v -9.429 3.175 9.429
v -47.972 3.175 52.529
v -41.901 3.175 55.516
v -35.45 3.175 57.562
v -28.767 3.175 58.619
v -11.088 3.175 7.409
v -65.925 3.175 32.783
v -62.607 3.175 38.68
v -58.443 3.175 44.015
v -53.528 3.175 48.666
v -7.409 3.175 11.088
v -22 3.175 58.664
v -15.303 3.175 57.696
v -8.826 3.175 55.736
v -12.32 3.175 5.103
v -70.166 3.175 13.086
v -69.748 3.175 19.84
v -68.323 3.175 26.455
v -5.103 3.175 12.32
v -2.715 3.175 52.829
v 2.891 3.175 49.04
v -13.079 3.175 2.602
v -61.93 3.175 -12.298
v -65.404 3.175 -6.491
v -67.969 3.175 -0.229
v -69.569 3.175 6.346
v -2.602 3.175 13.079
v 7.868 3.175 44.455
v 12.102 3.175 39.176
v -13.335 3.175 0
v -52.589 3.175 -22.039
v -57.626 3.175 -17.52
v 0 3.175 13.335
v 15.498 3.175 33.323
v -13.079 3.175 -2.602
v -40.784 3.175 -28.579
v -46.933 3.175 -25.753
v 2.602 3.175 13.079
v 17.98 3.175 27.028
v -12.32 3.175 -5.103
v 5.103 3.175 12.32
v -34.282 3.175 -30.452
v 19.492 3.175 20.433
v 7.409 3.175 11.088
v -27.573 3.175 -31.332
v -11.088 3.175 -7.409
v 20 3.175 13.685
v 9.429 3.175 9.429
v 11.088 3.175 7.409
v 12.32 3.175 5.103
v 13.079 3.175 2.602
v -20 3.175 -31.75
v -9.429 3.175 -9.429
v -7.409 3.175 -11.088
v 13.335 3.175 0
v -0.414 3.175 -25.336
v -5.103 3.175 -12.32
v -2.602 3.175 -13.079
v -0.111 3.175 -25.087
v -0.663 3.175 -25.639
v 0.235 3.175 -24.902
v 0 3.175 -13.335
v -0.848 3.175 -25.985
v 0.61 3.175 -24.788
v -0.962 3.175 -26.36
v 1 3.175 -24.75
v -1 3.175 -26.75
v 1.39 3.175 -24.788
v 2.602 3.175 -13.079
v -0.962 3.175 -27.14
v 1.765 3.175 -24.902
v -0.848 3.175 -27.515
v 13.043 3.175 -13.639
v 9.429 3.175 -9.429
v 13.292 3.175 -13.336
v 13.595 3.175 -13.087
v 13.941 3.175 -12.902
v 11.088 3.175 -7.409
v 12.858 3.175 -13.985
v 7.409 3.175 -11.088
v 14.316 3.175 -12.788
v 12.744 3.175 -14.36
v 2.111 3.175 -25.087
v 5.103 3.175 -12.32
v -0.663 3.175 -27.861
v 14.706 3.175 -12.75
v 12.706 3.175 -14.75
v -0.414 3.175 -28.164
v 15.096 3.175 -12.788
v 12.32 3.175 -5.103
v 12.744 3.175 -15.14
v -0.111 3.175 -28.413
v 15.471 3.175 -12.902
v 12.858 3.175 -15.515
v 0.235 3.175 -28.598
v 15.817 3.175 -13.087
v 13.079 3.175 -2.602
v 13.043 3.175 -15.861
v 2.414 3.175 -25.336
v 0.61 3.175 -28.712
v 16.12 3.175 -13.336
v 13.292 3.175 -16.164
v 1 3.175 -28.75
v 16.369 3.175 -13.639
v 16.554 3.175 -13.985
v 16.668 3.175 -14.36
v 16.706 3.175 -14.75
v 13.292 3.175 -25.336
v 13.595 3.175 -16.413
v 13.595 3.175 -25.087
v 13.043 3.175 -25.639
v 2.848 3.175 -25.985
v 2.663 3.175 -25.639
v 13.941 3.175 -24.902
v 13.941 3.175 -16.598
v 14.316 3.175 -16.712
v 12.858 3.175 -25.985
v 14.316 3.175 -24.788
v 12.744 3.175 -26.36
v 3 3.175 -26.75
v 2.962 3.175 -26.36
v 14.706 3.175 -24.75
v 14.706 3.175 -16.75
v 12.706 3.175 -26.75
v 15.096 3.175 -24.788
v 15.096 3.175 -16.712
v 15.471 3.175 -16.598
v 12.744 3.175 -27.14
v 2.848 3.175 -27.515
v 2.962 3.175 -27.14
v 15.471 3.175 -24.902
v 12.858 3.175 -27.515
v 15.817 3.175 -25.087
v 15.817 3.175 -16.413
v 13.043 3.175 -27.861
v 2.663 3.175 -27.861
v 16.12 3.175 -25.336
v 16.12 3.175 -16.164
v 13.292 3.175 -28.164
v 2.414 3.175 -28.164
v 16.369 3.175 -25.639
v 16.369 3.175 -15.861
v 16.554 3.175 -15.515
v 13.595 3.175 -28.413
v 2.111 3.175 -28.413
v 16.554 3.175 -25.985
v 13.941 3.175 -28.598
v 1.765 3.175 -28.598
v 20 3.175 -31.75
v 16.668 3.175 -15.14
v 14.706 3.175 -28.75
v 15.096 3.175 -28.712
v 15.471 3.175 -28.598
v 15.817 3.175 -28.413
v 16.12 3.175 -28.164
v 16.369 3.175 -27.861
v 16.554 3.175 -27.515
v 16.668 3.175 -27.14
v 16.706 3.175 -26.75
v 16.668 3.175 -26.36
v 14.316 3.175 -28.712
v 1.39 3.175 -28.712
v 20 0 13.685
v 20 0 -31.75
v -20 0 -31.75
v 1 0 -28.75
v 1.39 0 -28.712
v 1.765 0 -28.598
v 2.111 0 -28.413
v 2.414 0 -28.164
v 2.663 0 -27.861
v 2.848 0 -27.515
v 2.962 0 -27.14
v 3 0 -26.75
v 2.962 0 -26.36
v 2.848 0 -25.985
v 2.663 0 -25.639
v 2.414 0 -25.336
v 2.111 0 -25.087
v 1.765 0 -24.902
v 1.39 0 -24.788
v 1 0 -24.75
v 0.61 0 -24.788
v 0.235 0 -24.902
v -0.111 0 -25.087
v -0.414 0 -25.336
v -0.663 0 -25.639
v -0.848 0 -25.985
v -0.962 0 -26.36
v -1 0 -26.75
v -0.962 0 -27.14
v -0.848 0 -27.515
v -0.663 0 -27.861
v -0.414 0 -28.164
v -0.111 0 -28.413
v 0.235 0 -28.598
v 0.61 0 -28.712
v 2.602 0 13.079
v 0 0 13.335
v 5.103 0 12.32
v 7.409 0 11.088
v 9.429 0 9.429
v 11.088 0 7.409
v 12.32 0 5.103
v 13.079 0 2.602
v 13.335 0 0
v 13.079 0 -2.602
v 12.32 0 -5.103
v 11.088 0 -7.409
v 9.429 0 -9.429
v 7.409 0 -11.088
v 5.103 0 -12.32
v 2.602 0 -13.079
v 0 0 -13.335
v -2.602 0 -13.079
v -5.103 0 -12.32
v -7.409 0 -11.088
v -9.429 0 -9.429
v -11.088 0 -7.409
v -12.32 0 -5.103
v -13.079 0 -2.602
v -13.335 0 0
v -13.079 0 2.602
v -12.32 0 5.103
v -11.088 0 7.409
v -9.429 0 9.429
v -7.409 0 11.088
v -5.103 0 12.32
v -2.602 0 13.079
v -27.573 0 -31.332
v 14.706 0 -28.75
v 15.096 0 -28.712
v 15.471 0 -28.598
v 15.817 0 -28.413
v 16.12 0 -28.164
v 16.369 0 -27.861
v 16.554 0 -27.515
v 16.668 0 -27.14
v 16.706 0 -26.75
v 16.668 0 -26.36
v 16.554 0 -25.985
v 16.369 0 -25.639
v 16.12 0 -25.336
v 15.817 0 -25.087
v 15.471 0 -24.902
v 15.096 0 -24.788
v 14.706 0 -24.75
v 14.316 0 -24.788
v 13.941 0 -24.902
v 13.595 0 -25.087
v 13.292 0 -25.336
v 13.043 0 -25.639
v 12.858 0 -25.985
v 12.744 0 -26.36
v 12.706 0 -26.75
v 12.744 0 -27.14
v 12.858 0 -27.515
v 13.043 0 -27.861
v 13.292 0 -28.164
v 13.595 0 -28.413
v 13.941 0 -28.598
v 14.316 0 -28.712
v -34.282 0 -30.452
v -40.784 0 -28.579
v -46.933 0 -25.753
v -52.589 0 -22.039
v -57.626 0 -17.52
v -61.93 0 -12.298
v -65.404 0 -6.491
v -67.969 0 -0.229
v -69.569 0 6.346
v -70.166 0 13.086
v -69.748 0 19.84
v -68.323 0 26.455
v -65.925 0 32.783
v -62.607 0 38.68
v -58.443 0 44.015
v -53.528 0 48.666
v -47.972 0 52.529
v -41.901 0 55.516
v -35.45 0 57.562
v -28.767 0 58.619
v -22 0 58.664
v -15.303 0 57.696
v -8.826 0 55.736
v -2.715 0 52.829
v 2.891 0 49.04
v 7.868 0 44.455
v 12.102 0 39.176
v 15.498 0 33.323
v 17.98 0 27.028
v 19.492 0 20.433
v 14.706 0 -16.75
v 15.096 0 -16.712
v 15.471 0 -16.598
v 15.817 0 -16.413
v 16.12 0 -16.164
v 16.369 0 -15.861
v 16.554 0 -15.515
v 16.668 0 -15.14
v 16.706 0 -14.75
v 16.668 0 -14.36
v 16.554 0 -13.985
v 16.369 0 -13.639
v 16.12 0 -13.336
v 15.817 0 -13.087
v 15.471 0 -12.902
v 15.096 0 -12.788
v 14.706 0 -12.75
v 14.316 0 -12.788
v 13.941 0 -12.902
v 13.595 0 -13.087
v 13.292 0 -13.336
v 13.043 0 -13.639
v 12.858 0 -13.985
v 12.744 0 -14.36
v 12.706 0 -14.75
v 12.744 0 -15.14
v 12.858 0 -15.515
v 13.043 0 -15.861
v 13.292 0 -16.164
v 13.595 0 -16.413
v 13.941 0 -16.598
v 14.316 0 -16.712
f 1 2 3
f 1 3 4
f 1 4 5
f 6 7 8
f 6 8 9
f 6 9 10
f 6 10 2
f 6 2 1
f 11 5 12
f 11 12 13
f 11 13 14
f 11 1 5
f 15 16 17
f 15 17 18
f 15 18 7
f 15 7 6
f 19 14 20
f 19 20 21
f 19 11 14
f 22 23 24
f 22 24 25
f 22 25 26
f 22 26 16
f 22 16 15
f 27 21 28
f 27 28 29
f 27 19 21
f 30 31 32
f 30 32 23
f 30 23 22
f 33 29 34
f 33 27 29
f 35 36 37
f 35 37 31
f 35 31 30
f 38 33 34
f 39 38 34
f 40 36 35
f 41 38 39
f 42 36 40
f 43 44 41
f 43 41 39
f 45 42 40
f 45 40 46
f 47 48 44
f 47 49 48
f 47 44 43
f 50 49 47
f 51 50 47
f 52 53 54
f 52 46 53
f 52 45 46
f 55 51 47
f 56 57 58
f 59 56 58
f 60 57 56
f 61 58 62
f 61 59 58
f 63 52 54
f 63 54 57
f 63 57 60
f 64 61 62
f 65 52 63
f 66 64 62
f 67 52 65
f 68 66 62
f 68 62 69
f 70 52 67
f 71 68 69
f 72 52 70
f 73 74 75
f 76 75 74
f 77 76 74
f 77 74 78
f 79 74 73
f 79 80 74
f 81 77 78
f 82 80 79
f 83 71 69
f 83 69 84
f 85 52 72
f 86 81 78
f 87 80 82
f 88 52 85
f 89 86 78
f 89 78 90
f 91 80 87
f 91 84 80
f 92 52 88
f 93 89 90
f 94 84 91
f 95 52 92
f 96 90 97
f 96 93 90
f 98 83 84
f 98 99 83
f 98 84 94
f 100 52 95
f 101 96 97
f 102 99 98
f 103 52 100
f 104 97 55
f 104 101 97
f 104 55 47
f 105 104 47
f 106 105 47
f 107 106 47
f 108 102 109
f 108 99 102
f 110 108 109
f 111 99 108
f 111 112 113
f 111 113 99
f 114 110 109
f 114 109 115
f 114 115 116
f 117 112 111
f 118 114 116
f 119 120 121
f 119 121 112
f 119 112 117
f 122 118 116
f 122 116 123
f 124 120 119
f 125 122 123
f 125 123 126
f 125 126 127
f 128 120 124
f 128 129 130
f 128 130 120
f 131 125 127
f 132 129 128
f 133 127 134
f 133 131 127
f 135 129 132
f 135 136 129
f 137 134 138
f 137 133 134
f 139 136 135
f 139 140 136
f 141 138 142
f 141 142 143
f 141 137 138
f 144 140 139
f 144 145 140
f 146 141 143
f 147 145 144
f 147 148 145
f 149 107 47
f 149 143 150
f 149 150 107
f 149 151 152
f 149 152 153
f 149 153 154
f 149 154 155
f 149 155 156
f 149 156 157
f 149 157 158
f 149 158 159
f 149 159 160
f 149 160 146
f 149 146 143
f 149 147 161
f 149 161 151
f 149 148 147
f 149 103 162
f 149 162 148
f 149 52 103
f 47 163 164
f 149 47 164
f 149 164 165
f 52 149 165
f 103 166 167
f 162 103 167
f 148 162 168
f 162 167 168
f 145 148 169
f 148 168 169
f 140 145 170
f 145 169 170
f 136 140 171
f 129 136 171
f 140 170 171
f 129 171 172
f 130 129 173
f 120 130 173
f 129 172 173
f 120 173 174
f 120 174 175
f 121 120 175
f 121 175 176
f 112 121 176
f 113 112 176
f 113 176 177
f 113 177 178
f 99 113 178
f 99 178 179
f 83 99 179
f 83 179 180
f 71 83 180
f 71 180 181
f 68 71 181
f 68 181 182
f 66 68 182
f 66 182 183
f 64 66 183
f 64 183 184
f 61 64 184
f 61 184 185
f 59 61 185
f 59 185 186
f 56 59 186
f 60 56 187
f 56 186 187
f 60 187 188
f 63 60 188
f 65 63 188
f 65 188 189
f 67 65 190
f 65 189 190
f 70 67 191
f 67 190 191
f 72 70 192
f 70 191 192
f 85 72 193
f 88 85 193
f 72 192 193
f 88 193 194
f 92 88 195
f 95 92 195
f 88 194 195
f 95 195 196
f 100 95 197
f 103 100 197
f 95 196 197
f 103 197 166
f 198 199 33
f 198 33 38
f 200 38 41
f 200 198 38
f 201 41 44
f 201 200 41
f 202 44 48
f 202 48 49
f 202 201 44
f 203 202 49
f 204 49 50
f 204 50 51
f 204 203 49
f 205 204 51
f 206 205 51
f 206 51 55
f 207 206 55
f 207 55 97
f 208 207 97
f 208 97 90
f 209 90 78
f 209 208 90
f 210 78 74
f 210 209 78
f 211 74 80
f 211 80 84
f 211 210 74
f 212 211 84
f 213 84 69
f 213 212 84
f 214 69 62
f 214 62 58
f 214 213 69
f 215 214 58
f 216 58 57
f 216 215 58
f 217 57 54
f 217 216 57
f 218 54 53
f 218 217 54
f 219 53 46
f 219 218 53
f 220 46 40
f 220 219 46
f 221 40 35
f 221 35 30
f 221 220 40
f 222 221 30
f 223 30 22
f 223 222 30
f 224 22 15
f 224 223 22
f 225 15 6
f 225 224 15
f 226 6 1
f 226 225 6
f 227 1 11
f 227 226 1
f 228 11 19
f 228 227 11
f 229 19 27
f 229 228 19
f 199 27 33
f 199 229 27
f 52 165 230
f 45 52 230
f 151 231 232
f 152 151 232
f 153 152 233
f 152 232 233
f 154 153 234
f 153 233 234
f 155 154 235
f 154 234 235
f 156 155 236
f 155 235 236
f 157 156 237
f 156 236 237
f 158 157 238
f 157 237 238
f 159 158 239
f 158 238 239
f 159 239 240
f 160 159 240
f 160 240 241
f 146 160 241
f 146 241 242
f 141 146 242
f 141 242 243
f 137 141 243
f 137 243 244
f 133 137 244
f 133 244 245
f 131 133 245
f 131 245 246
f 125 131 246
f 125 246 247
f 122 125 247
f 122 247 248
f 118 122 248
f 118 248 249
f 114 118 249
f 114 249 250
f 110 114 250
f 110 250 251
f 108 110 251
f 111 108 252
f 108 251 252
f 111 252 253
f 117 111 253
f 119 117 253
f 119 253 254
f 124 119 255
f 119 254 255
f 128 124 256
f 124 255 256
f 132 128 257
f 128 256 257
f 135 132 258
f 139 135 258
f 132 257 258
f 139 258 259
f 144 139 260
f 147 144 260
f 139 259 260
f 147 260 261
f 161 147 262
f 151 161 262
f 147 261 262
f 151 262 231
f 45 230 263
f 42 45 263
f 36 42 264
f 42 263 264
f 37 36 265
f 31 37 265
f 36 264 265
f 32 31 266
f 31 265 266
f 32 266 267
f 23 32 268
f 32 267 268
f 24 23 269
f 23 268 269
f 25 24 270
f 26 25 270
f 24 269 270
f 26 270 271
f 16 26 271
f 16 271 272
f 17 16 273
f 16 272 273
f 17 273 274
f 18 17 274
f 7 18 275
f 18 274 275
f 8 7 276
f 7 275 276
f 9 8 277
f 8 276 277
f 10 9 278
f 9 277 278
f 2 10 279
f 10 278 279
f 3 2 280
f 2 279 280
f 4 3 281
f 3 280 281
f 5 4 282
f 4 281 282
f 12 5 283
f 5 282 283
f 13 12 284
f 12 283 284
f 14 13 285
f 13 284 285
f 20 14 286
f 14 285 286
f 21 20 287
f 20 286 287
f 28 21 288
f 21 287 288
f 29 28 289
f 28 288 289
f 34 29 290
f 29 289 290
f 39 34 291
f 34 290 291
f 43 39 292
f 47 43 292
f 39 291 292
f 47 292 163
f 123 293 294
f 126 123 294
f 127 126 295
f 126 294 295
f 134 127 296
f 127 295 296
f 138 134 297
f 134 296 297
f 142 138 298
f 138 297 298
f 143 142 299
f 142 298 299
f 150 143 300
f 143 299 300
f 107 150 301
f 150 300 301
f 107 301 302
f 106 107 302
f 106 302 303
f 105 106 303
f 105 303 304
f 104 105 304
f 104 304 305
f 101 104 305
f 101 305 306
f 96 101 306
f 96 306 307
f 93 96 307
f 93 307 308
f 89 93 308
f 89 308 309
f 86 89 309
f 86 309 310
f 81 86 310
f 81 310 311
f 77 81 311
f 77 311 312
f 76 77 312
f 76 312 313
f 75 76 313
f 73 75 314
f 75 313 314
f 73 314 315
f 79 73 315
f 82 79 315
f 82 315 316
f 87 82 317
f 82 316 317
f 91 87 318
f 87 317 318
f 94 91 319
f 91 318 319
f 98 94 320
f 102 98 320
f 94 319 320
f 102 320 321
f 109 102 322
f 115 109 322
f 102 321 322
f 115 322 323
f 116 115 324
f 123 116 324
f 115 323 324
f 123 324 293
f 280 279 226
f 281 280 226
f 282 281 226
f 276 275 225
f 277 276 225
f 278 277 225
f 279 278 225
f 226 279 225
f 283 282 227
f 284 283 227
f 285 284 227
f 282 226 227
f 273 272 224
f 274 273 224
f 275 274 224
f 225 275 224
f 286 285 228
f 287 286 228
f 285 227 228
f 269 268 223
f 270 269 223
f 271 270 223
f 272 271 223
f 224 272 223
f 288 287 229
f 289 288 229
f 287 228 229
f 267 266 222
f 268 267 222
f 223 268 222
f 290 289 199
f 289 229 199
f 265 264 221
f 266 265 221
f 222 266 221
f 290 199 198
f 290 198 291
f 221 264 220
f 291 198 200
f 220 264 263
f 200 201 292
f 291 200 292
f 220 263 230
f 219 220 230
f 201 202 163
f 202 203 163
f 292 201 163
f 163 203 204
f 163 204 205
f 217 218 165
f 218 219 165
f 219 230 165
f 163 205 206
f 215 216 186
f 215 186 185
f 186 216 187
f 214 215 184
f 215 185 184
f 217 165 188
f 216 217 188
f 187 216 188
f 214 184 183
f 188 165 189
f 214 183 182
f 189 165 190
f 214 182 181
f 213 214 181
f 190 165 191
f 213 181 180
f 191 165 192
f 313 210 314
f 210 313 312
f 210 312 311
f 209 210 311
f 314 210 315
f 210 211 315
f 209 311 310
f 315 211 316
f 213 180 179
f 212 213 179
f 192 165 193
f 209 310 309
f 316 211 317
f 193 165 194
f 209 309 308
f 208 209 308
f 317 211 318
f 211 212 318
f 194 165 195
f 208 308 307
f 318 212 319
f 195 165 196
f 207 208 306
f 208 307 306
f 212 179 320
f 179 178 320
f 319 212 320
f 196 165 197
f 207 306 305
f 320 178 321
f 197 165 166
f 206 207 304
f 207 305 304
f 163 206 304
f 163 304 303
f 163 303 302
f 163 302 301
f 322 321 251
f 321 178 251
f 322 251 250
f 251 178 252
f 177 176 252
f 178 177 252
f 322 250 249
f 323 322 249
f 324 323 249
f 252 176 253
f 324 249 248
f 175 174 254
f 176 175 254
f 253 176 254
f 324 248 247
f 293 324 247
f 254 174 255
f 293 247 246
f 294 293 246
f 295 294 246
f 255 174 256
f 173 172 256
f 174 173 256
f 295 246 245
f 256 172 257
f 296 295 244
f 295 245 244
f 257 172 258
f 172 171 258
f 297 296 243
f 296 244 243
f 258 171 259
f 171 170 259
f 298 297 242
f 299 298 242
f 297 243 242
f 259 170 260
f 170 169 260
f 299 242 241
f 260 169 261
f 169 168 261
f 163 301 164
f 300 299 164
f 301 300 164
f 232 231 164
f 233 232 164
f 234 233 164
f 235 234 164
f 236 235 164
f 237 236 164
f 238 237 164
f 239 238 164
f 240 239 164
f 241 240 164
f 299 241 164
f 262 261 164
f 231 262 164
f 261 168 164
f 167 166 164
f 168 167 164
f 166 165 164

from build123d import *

# Parameters (mm, degrees)
SKETCH1_R           = 13.335
BOSS_EXTRUDE1_DEPTH = 3.175
CUT_EXTRUDE1_REACH  = 93.585
SKETCH2_R           = 2


with BuildPart() as part:
    # Sketch1 → Boss-Extrude1 (new body)
    with BuildSketch(Plane(origin=(0, 0, 0), x_dir=(1, 0, 0), z_dir=(0, 1, 0))):
        with BuildLine():
            Line((-20.000000005, 31.75), (-27.57263297, 31.331531049))
            ThreePointArc((-27.57263297, 31.331531049), (-56.072919353, -46.432398987), (20.000000005, -13.684787183))
            Line((20.000000005, -13.684787183), (20.000000005, 31.75))
            Line((20.000000005, 31.75), (-20.000000005, 31.75))
        make_face()
        with Locations(Location((0, 0, 0), (0, 0, 270))):
            Circle(SKETCH1_R, mode=Mode.SUBTRACT)
    extrude(amount=BOSS_EXTRUDE1_DEPTH)

    # Sketch2 → Cut-Extrude1 (cut, up to next)
    with BuildSketch(Plane.XZ, mode=Mode.PRIVATE) as cut_extrude1_sk1:
        with Locations(Location((14.706006433, -14.75, 0), (0, 0, 270))):
            Circle(SKETCH2_R)
    cut_extrude1_tool1 = extrude(cut_extrude1_sk1.sketch, amount=-CUT_EXTRUDE1_REACH, mode=Mode.PRIVATE) & part.part
    # Sketch2 → Cut-Extrude1 (cut, up to next)
    with BuildSketch(Plane.XZ, mode=Mode.PRIVATE) as cut_extrude1_sk2:
        with Locations(Location((14.706006433, -26.75, 0), (0, 0, 270))):
            Circle(SKETCH2_R)
    cut_extrude1_tool2 = extrude(cut_extrude1_sk2.sketch, amount=-CUT_EXTRUDE1_REACH, mode=Mode.PRIVATE) & part.part
    # Sketch2 → Cut-Extrude1 (cut, up to next)
    with BuildSketch(Plane.XZ, mode=Mode.PRIVATE) as cut_extrude1_sk3:
        with Locations(Location((1, -26.75, 0), (0, 0, 270))):
            Circle(SKETCH2_R)
    cut_extrude1_tool3 = extrude(cut_extrude1_sk3.sketch, amount=-CUT_EXTRUDE1_REACH, mode=Mode.PRIVATE) & part.part
    add(cut_extrude1_tool1.solids().sort_by_distance((14.706006, 0, -14.75))[0], mode=Mode.SUBTRACT)
    add(cut_extrude1_tool2.solids().sort_by_distance((14.706006, 0, -26.75))[0], mode=Mode.SUBTRACT)
    add(cut_extrude1_tool3.solids().sort_by_distance((1, 0, -26.75))[0], mode=Mode.SUBTRACT)


solid = part.part
